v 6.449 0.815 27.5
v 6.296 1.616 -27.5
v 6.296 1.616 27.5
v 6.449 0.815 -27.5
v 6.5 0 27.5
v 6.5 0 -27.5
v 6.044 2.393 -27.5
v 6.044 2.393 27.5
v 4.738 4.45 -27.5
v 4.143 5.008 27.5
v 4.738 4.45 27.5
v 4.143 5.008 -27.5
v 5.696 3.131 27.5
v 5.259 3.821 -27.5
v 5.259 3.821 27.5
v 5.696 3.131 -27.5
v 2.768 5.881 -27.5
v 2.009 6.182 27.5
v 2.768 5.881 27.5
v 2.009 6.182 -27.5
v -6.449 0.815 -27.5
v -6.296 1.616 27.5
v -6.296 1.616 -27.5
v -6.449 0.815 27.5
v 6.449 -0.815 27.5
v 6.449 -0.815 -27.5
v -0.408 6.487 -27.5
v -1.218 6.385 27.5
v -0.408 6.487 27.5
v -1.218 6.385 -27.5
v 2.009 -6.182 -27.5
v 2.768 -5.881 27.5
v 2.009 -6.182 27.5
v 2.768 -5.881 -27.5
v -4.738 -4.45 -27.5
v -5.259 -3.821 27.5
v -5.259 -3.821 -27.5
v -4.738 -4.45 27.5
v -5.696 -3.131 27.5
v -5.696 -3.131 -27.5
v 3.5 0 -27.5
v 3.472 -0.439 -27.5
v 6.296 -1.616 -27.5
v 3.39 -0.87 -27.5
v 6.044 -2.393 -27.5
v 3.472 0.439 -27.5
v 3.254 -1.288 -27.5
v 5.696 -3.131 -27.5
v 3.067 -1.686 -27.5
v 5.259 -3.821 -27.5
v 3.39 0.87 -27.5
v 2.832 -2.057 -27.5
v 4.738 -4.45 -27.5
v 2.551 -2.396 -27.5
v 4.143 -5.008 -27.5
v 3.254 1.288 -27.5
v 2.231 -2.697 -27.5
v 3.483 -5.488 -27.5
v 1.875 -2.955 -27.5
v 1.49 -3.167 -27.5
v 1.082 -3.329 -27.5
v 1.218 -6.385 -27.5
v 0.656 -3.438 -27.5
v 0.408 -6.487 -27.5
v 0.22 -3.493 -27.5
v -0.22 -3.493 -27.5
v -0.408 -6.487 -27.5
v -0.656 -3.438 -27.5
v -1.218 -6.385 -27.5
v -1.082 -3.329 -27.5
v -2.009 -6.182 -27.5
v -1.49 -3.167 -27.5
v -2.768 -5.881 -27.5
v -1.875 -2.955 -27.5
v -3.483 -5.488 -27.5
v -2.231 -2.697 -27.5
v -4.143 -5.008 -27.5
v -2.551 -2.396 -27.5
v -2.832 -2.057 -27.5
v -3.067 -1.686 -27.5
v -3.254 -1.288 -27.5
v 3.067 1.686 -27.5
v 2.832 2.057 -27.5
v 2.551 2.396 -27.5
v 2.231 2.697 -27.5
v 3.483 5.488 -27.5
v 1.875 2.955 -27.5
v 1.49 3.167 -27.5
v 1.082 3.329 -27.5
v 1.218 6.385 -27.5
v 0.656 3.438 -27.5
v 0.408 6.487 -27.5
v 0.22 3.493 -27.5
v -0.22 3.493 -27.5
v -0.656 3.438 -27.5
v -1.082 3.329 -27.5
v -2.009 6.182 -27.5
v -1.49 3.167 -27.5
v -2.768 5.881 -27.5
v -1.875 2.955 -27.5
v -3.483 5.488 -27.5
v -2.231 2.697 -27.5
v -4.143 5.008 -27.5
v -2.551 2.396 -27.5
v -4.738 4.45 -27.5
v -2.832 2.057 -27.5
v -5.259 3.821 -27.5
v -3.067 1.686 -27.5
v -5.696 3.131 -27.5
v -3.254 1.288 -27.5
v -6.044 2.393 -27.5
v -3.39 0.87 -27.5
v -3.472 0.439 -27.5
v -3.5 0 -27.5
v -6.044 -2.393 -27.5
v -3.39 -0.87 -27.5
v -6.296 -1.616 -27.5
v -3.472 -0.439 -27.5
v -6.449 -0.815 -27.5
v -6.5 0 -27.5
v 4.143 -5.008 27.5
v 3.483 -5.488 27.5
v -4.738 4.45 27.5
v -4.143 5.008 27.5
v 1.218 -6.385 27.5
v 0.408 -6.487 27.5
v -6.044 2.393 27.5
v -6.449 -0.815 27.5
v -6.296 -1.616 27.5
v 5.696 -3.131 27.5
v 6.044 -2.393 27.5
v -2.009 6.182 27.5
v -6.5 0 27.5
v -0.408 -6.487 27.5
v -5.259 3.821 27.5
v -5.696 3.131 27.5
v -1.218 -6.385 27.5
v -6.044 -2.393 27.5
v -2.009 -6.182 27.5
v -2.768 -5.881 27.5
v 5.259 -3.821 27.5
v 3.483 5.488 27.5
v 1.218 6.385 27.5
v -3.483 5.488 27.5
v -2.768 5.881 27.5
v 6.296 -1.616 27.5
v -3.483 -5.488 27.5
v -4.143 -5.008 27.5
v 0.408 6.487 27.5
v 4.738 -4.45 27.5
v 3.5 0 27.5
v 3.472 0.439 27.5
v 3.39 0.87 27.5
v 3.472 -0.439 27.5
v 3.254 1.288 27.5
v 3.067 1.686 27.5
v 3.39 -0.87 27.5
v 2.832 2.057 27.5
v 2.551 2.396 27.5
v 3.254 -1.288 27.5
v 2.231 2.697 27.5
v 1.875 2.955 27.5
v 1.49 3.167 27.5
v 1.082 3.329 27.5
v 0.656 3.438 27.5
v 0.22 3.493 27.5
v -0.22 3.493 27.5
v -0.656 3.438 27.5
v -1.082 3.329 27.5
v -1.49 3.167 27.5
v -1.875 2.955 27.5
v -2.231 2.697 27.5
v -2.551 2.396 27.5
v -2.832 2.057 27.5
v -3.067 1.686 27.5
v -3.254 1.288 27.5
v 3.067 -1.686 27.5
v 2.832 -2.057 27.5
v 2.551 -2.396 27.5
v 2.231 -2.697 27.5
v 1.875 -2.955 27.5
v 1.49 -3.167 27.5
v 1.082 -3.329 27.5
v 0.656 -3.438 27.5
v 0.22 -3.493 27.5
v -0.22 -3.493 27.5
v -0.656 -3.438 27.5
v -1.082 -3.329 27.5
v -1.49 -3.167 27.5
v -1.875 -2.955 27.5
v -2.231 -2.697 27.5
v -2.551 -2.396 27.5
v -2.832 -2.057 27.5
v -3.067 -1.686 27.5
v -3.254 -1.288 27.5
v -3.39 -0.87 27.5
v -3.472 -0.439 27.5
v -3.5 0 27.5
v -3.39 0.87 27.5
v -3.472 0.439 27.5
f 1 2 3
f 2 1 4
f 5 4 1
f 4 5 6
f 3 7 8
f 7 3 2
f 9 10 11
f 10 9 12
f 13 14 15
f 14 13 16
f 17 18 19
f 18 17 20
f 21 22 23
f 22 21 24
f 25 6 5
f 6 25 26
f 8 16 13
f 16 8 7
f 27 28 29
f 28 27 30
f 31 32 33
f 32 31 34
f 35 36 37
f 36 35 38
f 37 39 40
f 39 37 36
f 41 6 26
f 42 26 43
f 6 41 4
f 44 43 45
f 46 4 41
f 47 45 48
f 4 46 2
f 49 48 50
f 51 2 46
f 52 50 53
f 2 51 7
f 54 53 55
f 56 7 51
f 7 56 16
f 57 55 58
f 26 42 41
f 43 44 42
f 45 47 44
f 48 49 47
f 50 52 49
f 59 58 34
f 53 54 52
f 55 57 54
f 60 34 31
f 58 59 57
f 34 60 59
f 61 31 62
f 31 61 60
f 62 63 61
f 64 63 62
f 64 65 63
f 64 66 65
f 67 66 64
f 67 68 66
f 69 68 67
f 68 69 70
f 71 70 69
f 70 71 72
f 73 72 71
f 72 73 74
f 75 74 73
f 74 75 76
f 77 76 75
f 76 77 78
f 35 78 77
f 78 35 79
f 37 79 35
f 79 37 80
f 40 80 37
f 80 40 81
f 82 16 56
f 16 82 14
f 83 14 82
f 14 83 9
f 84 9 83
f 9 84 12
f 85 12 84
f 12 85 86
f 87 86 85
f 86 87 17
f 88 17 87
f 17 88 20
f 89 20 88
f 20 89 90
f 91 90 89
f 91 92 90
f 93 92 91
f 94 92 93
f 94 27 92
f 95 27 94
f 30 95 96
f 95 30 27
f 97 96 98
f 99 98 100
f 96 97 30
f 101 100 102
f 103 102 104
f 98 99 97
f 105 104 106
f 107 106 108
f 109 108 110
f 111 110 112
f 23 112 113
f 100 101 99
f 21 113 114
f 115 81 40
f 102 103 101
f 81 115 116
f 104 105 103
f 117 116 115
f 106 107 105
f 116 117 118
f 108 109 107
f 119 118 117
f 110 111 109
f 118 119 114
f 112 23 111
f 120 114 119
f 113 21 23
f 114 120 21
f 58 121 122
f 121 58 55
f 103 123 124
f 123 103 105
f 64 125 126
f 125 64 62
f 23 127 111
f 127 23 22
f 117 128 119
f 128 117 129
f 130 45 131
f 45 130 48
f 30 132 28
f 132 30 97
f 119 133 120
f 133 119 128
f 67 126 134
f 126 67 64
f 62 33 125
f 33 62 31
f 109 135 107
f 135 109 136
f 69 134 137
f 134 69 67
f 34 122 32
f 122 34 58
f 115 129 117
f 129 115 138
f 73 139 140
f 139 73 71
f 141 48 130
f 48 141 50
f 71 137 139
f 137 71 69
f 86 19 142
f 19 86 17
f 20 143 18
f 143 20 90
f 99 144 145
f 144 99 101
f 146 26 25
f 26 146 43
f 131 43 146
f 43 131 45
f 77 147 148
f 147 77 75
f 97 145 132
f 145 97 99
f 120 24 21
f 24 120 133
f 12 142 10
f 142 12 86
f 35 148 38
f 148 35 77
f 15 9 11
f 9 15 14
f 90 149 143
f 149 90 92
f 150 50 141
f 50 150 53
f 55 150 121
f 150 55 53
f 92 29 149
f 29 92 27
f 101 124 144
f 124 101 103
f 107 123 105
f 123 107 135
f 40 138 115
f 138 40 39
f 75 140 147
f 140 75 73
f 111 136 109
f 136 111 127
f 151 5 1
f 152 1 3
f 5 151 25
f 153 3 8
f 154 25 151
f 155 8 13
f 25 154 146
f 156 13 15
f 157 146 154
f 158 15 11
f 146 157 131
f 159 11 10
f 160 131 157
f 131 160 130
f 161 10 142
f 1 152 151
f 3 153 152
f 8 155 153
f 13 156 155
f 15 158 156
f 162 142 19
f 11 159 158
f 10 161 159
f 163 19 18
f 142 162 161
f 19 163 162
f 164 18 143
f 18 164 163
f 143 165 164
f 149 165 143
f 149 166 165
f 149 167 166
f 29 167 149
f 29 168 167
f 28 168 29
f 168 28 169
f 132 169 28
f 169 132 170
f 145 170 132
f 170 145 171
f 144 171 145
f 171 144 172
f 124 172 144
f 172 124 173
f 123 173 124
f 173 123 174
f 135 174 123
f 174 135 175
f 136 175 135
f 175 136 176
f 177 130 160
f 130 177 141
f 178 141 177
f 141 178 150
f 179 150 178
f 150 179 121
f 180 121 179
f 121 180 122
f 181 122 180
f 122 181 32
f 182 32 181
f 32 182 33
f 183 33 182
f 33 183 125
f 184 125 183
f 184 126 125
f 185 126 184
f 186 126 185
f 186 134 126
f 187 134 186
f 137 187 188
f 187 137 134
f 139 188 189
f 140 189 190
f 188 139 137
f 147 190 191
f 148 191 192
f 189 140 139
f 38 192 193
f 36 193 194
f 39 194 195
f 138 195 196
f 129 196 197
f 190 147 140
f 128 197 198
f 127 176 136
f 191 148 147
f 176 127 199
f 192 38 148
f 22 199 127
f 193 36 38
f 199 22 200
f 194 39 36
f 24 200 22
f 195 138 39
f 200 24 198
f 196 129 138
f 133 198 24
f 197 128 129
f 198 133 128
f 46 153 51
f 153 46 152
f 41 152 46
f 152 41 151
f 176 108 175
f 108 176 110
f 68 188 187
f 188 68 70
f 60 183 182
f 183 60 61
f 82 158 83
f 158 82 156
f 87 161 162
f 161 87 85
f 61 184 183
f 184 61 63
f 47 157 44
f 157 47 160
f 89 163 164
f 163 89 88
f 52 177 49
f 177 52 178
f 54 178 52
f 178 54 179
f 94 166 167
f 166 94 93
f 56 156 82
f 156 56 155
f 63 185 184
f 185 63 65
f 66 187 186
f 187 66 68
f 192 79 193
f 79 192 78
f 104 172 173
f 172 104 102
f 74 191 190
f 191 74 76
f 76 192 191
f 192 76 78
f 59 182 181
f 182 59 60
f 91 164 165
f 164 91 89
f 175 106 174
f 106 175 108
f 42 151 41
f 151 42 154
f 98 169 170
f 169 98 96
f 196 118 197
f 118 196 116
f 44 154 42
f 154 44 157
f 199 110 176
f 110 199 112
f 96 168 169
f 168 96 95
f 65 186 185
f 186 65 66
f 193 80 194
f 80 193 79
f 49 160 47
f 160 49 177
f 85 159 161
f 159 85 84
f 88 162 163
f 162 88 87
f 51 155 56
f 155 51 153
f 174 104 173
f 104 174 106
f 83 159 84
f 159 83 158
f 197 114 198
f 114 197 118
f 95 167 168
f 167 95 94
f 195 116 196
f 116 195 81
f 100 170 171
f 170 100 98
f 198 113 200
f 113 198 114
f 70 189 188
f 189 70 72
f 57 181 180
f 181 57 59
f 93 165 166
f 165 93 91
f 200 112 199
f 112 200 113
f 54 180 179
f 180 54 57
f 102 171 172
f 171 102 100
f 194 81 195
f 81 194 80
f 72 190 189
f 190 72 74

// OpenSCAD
$fn = 50;


difference() {
	union() {
		translate(v = [0, 0, -27.5000000000]) {
			cylinder(h = 55, r = 6.5000000000);
		}
	}
	union() {
		translate(v = [0, 0, -100.0000000000]) {
			cylinder(h = 200, r = 3.5000000000);
		}
	}
}
